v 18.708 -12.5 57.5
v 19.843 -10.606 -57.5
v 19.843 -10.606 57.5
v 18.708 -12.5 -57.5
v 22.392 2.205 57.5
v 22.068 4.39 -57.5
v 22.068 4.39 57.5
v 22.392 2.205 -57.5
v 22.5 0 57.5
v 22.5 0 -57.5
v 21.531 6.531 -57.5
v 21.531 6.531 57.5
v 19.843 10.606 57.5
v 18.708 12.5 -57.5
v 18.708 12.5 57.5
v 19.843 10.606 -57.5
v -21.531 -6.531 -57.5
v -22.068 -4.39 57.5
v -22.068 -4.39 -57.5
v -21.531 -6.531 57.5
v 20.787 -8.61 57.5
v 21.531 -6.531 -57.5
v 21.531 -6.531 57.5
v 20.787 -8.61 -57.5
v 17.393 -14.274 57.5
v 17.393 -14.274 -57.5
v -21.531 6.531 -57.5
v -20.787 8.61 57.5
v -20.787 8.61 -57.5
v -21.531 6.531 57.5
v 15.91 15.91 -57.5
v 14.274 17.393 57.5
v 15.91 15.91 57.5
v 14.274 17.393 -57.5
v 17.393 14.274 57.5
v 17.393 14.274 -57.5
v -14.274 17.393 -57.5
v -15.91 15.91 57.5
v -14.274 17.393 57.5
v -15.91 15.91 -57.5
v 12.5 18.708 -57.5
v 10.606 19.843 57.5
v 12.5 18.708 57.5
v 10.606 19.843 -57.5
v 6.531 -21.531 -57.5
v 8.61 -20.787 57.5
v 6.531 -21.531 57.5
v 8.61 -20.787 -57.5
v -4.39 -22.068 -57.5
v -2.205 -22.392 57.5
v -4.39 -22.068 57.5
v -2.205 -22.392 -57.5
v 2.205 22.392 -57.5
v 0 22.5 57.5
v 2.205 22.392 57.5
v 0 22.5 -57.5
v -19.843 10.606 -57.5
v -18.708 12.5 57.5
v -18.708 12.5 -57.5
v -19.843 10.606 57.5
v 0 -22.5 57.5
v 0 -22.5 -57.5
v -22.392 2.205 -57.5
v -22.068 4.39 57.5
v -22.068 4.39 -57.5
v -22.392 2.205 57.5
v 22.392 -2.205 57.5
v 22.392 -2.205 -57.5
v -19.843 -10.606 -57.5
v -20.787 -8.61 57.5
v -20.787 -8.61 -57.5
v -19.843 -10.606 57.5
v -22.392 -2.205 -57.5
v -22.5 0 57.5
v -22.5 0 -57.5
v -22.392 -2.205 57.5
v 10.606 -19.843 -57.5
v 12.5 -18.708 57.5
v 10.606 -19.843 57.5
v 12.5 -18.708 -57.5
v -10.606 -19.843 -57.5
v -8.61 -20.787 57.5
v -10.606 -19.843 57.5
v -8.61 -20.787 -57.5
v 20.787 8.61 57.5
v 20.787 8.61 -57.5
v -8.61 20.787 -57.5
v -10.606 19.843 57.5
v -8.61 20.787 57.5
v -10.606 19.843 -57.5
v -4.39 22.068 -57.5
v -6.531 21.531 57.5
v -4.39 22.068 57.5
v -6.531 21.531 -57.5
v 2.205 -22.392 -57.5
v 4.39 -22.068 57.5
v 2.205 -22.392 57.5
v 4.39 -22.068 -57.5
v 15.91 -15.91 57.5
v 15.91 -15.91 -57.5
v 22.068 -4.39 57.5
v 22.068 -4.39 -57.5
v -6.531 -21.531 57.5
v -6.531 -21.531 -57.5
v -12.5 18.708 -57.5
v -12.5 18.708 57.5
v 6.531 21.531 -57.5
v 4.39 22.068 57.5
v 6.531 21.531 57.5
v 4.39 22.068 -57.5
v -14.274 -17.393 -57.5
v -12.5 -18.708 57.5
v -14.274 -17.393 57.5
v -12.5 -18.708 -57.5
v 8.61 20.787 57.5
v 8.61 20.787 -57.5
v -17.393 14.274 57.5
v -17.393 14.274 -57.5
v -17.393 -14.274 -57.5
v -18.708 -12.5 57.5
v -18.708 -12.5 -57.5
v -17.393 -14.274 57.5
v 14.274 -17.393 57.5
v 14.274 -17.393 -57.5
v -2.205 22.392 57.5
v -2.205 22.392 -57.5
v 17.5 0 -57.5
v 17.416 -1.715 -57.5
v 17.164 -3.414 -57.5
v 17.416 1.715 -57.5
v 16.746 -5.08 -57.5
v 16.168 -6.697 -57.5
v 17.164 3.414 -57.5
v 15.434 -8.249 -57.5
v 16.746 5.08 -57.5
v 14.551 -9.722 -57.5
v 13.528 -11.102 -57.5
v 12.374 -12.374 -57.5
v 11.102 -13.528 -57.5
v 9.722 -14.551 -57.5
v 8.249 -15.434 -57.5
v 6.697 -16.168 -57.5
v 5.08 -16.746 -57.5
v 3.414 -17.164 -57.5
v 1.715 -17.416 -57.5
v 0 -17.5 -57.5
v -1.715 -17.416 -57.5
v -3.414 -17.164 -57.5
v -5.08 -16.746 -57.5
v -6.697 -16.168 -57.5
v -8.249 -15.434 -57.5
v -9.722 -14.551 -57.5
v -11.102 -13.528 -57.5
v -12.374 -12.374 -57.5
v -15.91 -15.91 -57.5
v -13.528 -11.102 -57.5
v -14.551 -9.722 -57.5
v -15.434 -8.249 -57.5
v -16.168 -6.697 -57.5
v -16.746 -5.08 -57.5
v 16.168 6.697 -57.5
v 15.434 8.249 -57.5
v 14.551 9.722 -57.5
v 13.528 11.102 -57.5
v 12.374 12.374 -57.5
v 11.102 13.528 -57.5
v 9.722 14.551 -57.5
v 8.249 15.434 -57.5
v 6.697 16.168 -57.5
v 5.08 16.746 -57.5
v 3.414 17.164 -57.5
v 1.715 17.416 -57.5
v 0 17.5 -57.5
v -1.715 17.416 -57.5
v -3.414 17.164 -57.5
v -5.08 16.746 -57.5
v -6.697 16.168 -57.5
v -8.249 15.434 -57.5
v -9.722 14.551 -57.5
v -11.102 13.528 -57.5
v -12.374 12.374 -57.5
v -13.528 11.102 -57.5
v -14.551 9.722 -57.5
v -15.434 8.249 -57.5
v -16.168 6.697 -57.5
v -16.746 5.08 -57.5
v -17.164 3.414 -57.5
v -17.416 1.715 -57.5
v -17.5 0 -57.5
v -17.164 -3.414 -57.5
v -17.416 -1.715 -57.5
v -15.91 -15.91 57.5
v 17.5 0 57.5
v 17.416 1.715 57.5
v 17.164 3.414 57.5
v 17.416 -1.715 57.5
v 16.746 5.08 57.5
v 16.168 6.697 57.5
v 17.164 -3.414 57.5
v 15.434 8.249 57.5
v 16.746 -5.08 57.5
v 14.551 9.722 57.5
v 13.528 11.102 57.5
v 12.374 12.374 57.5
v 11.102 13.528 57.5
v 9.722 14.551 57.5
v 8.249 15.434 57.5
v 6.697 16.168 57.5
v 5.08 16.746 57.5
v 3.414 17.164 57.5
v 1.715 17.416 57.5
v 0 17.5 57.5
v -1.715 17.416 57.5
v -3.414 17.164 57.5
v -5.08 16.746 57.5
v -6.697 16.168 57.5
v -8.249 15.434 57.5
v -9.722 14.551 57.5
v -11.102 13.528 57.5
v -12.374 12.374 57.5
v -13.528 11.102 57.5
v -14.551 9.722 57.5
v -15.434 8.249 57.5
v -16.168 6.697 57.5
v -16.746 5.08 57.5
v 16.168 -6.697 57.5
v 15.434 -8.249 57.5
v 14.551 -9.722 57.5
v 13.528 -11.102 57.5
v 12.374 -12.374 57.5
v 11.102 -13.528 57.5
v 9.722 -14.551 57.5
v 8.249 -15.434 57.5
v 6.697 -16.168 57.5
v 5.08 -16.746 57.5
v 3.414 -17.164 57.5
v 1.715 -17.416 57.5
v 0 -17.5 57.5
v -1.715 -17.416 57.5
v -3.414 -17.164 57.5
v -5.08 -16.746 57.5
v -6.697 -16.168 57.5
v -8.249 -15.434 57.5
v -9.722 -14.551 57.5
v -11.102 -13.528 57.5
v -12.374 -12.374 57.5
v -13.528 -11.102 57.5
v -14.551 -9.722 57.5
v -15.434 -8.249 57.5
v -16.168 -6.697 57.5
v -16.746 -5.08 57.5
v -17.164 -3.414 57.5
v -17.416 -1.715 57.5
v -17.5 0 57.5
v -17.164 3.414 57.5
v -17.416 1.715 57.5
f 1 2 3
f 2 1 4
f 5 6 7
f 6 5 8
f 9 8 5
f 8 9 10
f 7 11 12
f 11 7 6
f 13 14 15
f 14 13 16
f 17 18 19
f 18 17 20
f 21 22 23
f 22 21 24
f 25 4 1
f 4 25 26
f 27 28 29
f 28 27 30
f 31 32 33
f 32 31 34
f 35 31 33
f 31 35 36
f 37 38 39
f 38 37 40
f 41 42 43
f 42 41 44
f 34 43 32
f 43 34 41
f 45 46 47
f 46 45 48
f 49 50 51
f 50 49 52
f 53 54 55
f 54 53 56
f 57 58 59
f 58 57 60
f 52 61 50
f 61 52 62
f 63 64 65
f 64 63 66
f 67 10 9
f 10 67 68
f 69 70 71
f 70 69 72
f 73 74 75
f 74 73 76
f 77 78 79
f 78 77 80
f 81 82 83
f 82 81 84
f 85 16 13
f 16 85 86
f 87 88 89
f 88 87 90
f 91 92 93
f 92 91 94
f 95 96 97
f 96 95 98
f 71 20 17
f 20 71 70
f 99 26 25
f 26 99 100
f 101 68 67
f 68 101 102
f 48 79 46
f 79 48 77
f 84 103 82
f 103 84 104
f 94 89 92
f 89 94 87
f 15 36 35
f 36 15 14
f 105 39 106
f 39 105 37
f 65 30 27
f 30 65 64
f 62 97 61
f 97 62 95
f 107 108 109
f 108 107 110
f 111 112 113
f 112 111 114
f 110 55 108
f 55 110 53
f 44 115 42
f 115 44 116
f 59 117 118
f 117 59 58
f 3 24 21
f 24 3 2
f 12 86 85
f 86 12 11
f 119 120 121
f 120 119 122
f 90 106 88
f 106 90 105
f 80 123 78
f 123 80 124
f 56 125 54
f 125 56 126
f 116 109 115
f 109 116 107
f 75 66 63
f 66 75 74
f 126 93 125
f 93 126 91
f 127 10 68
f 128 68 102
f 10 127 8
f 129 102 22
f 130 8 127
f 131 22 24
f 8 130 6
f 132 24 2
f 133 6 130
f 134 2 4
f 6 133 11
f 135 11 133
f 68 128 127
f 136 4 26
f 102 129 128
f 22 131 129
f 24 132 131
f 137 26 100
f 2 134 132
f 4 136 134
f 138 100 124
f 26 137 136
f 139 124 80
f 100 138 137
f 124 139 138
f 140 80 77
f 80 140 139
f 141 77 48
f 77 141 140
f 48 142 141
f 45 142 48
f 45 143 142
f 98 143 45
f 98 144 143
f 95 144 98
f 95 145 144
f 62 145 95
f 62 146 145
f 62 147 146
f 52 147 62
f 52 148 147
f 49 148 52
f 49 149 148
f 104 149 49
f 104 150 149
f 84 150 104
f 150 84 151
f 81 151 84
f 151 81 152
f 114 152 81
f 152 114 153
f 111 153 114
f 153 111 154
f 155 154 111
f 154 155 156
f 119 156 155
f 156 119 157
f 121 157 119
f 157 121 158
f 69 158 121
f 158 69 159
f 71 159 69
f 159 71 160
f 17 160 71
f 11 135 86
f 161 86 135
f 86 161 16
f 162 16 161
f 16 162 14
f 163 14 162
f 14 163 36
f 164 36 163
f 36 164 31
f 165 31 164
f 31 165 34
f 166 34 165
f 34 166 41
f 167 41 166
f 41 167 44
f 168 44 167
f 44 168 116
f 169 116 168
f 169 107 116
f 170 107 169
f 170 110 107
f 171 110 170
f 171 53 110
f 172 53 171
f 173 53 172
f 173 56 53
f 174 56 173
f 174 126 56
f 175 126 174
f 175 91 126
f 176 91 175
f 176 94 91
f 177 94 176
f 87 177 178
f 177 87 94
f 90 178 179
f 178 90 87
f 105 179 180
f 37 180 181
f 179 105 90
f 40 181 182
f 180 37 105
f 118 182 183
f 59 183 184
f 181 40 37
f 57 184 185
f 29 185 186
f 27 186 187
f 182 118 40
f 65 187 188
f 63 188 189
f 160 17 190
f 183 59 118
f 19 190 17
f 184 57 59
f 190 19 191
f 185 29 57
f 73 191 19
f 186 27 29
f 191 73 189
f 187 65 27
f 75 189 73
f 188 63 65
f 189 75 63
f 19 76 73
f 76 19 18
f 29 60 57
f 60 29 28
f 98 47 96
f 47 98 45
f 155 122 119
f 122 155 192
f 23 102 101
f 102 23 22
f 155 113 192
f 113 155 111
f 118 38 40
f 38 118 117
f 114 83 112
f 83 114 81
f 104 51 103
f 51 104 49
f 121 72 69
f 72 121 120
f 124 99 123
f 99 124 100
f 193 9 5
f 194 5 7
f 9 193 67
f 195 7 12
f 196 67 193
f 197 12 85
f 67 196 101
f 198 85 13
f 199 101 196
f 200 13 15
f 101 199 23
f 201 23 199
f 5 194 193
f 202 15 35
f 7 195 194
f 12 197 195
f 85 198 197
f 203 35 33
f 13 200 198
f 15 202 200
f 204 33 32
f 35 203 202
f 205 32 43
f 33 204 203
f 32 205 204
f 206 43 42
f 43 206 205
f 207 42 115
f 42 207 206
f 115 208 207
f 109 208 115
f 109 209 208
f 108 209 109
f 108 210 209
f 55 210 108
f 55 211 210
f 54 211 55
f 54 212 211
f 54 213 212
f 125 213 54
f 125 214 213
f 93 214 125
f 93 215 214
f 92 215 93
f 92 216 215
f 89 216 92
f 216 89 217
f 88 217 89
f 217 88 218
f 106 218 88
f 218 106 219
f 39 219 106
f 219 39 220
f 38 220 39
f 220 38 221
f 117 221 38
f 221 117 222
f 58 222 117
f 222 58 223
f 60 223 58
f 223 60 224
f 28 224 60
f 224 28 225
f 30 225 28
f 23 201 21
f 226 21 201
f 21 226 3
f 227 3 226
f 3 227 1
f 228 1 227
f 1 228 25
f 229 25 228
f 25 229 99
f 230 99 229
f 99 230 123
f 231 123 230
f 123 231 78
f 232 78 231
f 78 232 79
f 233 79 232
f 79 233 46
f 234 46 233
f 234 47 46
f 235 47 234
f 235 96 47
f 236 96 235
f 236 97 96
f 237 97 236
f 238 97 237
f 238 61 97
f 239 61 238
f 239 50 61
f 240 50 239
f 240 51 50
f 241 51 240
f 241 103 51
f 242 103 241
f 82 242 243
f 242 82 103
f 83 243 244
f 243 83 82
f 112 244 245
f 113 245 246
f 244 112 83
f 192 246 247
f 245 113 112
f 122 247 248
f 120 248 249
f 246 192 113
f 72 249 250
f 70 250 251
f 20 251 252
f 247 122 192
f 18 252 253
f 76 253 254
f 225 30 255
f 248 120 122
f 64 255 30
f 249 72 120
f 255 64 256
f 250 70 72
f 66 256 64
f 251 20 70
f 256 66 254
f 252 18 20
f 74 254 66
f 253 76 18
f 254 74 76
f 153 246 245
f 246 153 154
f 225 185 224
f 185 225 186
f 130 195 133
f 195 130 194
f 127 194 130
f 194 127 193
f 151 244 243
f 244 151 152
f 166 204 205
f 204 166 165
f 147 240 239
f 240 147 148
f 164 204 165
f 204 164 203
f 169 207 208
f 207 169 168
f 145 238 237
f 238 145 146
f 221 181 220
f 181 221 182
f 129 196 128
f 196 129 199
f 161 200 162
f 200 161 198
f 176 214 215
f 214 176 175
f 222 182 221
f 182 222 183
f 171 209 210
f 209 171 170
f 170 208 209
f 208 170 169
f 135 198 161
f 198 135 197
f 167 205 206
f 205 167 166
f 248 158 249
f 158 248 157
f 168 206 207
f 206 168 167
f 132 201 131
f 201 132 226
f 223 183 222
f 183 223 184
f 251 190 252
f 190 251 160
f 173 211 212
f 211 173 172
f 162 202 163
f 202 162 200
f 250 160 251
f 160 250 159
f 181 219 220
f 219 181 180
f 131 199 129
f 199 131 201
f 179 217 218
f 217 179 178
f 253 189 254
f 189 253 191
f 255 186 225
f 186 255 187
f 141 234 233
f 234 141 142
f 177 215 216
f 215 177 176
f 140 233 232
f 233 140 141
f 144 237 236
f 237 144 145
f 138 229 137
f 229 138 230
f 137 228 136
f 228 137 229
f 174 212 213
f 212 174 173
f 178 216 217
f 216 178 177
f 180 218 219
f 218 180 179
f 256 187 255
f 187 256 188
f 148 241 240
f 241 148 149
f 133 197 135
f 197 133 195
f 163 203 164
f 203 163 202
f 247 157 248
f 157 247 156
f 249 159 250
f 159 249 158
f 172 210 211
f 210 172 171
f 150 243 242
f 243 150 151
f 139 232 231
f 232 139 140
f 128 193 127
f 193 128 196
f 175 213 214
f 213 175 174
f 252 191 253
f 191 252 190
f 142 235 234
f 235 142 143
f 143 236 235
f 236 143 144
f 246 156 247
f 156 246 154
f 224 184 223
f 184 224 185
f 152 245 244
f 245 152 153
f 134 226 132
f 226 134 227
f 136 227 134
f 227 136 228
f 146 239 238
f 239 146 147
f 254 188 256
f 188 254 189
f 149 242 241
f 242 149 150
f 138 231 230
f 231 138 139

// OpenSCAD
module thick_walled_ring() {
    difference() {
        // Outer cylinder
        cylinder(h=115, d=45, $fn=64);
        
        // Inner bore
        translate([0, 0, -1])
            cylinder(h=117, d=35, $fn=64);
        
        // Rectangular cutouts
        for (i = [0, 90, 180, 270]) {
            rotate([0, 0, i])
                translate([22.5, -5, 0])
                    cube([10, 10, 115]);
        }
    }
}

translate([0, 0, -57.5])
    thick_walled_ring();
